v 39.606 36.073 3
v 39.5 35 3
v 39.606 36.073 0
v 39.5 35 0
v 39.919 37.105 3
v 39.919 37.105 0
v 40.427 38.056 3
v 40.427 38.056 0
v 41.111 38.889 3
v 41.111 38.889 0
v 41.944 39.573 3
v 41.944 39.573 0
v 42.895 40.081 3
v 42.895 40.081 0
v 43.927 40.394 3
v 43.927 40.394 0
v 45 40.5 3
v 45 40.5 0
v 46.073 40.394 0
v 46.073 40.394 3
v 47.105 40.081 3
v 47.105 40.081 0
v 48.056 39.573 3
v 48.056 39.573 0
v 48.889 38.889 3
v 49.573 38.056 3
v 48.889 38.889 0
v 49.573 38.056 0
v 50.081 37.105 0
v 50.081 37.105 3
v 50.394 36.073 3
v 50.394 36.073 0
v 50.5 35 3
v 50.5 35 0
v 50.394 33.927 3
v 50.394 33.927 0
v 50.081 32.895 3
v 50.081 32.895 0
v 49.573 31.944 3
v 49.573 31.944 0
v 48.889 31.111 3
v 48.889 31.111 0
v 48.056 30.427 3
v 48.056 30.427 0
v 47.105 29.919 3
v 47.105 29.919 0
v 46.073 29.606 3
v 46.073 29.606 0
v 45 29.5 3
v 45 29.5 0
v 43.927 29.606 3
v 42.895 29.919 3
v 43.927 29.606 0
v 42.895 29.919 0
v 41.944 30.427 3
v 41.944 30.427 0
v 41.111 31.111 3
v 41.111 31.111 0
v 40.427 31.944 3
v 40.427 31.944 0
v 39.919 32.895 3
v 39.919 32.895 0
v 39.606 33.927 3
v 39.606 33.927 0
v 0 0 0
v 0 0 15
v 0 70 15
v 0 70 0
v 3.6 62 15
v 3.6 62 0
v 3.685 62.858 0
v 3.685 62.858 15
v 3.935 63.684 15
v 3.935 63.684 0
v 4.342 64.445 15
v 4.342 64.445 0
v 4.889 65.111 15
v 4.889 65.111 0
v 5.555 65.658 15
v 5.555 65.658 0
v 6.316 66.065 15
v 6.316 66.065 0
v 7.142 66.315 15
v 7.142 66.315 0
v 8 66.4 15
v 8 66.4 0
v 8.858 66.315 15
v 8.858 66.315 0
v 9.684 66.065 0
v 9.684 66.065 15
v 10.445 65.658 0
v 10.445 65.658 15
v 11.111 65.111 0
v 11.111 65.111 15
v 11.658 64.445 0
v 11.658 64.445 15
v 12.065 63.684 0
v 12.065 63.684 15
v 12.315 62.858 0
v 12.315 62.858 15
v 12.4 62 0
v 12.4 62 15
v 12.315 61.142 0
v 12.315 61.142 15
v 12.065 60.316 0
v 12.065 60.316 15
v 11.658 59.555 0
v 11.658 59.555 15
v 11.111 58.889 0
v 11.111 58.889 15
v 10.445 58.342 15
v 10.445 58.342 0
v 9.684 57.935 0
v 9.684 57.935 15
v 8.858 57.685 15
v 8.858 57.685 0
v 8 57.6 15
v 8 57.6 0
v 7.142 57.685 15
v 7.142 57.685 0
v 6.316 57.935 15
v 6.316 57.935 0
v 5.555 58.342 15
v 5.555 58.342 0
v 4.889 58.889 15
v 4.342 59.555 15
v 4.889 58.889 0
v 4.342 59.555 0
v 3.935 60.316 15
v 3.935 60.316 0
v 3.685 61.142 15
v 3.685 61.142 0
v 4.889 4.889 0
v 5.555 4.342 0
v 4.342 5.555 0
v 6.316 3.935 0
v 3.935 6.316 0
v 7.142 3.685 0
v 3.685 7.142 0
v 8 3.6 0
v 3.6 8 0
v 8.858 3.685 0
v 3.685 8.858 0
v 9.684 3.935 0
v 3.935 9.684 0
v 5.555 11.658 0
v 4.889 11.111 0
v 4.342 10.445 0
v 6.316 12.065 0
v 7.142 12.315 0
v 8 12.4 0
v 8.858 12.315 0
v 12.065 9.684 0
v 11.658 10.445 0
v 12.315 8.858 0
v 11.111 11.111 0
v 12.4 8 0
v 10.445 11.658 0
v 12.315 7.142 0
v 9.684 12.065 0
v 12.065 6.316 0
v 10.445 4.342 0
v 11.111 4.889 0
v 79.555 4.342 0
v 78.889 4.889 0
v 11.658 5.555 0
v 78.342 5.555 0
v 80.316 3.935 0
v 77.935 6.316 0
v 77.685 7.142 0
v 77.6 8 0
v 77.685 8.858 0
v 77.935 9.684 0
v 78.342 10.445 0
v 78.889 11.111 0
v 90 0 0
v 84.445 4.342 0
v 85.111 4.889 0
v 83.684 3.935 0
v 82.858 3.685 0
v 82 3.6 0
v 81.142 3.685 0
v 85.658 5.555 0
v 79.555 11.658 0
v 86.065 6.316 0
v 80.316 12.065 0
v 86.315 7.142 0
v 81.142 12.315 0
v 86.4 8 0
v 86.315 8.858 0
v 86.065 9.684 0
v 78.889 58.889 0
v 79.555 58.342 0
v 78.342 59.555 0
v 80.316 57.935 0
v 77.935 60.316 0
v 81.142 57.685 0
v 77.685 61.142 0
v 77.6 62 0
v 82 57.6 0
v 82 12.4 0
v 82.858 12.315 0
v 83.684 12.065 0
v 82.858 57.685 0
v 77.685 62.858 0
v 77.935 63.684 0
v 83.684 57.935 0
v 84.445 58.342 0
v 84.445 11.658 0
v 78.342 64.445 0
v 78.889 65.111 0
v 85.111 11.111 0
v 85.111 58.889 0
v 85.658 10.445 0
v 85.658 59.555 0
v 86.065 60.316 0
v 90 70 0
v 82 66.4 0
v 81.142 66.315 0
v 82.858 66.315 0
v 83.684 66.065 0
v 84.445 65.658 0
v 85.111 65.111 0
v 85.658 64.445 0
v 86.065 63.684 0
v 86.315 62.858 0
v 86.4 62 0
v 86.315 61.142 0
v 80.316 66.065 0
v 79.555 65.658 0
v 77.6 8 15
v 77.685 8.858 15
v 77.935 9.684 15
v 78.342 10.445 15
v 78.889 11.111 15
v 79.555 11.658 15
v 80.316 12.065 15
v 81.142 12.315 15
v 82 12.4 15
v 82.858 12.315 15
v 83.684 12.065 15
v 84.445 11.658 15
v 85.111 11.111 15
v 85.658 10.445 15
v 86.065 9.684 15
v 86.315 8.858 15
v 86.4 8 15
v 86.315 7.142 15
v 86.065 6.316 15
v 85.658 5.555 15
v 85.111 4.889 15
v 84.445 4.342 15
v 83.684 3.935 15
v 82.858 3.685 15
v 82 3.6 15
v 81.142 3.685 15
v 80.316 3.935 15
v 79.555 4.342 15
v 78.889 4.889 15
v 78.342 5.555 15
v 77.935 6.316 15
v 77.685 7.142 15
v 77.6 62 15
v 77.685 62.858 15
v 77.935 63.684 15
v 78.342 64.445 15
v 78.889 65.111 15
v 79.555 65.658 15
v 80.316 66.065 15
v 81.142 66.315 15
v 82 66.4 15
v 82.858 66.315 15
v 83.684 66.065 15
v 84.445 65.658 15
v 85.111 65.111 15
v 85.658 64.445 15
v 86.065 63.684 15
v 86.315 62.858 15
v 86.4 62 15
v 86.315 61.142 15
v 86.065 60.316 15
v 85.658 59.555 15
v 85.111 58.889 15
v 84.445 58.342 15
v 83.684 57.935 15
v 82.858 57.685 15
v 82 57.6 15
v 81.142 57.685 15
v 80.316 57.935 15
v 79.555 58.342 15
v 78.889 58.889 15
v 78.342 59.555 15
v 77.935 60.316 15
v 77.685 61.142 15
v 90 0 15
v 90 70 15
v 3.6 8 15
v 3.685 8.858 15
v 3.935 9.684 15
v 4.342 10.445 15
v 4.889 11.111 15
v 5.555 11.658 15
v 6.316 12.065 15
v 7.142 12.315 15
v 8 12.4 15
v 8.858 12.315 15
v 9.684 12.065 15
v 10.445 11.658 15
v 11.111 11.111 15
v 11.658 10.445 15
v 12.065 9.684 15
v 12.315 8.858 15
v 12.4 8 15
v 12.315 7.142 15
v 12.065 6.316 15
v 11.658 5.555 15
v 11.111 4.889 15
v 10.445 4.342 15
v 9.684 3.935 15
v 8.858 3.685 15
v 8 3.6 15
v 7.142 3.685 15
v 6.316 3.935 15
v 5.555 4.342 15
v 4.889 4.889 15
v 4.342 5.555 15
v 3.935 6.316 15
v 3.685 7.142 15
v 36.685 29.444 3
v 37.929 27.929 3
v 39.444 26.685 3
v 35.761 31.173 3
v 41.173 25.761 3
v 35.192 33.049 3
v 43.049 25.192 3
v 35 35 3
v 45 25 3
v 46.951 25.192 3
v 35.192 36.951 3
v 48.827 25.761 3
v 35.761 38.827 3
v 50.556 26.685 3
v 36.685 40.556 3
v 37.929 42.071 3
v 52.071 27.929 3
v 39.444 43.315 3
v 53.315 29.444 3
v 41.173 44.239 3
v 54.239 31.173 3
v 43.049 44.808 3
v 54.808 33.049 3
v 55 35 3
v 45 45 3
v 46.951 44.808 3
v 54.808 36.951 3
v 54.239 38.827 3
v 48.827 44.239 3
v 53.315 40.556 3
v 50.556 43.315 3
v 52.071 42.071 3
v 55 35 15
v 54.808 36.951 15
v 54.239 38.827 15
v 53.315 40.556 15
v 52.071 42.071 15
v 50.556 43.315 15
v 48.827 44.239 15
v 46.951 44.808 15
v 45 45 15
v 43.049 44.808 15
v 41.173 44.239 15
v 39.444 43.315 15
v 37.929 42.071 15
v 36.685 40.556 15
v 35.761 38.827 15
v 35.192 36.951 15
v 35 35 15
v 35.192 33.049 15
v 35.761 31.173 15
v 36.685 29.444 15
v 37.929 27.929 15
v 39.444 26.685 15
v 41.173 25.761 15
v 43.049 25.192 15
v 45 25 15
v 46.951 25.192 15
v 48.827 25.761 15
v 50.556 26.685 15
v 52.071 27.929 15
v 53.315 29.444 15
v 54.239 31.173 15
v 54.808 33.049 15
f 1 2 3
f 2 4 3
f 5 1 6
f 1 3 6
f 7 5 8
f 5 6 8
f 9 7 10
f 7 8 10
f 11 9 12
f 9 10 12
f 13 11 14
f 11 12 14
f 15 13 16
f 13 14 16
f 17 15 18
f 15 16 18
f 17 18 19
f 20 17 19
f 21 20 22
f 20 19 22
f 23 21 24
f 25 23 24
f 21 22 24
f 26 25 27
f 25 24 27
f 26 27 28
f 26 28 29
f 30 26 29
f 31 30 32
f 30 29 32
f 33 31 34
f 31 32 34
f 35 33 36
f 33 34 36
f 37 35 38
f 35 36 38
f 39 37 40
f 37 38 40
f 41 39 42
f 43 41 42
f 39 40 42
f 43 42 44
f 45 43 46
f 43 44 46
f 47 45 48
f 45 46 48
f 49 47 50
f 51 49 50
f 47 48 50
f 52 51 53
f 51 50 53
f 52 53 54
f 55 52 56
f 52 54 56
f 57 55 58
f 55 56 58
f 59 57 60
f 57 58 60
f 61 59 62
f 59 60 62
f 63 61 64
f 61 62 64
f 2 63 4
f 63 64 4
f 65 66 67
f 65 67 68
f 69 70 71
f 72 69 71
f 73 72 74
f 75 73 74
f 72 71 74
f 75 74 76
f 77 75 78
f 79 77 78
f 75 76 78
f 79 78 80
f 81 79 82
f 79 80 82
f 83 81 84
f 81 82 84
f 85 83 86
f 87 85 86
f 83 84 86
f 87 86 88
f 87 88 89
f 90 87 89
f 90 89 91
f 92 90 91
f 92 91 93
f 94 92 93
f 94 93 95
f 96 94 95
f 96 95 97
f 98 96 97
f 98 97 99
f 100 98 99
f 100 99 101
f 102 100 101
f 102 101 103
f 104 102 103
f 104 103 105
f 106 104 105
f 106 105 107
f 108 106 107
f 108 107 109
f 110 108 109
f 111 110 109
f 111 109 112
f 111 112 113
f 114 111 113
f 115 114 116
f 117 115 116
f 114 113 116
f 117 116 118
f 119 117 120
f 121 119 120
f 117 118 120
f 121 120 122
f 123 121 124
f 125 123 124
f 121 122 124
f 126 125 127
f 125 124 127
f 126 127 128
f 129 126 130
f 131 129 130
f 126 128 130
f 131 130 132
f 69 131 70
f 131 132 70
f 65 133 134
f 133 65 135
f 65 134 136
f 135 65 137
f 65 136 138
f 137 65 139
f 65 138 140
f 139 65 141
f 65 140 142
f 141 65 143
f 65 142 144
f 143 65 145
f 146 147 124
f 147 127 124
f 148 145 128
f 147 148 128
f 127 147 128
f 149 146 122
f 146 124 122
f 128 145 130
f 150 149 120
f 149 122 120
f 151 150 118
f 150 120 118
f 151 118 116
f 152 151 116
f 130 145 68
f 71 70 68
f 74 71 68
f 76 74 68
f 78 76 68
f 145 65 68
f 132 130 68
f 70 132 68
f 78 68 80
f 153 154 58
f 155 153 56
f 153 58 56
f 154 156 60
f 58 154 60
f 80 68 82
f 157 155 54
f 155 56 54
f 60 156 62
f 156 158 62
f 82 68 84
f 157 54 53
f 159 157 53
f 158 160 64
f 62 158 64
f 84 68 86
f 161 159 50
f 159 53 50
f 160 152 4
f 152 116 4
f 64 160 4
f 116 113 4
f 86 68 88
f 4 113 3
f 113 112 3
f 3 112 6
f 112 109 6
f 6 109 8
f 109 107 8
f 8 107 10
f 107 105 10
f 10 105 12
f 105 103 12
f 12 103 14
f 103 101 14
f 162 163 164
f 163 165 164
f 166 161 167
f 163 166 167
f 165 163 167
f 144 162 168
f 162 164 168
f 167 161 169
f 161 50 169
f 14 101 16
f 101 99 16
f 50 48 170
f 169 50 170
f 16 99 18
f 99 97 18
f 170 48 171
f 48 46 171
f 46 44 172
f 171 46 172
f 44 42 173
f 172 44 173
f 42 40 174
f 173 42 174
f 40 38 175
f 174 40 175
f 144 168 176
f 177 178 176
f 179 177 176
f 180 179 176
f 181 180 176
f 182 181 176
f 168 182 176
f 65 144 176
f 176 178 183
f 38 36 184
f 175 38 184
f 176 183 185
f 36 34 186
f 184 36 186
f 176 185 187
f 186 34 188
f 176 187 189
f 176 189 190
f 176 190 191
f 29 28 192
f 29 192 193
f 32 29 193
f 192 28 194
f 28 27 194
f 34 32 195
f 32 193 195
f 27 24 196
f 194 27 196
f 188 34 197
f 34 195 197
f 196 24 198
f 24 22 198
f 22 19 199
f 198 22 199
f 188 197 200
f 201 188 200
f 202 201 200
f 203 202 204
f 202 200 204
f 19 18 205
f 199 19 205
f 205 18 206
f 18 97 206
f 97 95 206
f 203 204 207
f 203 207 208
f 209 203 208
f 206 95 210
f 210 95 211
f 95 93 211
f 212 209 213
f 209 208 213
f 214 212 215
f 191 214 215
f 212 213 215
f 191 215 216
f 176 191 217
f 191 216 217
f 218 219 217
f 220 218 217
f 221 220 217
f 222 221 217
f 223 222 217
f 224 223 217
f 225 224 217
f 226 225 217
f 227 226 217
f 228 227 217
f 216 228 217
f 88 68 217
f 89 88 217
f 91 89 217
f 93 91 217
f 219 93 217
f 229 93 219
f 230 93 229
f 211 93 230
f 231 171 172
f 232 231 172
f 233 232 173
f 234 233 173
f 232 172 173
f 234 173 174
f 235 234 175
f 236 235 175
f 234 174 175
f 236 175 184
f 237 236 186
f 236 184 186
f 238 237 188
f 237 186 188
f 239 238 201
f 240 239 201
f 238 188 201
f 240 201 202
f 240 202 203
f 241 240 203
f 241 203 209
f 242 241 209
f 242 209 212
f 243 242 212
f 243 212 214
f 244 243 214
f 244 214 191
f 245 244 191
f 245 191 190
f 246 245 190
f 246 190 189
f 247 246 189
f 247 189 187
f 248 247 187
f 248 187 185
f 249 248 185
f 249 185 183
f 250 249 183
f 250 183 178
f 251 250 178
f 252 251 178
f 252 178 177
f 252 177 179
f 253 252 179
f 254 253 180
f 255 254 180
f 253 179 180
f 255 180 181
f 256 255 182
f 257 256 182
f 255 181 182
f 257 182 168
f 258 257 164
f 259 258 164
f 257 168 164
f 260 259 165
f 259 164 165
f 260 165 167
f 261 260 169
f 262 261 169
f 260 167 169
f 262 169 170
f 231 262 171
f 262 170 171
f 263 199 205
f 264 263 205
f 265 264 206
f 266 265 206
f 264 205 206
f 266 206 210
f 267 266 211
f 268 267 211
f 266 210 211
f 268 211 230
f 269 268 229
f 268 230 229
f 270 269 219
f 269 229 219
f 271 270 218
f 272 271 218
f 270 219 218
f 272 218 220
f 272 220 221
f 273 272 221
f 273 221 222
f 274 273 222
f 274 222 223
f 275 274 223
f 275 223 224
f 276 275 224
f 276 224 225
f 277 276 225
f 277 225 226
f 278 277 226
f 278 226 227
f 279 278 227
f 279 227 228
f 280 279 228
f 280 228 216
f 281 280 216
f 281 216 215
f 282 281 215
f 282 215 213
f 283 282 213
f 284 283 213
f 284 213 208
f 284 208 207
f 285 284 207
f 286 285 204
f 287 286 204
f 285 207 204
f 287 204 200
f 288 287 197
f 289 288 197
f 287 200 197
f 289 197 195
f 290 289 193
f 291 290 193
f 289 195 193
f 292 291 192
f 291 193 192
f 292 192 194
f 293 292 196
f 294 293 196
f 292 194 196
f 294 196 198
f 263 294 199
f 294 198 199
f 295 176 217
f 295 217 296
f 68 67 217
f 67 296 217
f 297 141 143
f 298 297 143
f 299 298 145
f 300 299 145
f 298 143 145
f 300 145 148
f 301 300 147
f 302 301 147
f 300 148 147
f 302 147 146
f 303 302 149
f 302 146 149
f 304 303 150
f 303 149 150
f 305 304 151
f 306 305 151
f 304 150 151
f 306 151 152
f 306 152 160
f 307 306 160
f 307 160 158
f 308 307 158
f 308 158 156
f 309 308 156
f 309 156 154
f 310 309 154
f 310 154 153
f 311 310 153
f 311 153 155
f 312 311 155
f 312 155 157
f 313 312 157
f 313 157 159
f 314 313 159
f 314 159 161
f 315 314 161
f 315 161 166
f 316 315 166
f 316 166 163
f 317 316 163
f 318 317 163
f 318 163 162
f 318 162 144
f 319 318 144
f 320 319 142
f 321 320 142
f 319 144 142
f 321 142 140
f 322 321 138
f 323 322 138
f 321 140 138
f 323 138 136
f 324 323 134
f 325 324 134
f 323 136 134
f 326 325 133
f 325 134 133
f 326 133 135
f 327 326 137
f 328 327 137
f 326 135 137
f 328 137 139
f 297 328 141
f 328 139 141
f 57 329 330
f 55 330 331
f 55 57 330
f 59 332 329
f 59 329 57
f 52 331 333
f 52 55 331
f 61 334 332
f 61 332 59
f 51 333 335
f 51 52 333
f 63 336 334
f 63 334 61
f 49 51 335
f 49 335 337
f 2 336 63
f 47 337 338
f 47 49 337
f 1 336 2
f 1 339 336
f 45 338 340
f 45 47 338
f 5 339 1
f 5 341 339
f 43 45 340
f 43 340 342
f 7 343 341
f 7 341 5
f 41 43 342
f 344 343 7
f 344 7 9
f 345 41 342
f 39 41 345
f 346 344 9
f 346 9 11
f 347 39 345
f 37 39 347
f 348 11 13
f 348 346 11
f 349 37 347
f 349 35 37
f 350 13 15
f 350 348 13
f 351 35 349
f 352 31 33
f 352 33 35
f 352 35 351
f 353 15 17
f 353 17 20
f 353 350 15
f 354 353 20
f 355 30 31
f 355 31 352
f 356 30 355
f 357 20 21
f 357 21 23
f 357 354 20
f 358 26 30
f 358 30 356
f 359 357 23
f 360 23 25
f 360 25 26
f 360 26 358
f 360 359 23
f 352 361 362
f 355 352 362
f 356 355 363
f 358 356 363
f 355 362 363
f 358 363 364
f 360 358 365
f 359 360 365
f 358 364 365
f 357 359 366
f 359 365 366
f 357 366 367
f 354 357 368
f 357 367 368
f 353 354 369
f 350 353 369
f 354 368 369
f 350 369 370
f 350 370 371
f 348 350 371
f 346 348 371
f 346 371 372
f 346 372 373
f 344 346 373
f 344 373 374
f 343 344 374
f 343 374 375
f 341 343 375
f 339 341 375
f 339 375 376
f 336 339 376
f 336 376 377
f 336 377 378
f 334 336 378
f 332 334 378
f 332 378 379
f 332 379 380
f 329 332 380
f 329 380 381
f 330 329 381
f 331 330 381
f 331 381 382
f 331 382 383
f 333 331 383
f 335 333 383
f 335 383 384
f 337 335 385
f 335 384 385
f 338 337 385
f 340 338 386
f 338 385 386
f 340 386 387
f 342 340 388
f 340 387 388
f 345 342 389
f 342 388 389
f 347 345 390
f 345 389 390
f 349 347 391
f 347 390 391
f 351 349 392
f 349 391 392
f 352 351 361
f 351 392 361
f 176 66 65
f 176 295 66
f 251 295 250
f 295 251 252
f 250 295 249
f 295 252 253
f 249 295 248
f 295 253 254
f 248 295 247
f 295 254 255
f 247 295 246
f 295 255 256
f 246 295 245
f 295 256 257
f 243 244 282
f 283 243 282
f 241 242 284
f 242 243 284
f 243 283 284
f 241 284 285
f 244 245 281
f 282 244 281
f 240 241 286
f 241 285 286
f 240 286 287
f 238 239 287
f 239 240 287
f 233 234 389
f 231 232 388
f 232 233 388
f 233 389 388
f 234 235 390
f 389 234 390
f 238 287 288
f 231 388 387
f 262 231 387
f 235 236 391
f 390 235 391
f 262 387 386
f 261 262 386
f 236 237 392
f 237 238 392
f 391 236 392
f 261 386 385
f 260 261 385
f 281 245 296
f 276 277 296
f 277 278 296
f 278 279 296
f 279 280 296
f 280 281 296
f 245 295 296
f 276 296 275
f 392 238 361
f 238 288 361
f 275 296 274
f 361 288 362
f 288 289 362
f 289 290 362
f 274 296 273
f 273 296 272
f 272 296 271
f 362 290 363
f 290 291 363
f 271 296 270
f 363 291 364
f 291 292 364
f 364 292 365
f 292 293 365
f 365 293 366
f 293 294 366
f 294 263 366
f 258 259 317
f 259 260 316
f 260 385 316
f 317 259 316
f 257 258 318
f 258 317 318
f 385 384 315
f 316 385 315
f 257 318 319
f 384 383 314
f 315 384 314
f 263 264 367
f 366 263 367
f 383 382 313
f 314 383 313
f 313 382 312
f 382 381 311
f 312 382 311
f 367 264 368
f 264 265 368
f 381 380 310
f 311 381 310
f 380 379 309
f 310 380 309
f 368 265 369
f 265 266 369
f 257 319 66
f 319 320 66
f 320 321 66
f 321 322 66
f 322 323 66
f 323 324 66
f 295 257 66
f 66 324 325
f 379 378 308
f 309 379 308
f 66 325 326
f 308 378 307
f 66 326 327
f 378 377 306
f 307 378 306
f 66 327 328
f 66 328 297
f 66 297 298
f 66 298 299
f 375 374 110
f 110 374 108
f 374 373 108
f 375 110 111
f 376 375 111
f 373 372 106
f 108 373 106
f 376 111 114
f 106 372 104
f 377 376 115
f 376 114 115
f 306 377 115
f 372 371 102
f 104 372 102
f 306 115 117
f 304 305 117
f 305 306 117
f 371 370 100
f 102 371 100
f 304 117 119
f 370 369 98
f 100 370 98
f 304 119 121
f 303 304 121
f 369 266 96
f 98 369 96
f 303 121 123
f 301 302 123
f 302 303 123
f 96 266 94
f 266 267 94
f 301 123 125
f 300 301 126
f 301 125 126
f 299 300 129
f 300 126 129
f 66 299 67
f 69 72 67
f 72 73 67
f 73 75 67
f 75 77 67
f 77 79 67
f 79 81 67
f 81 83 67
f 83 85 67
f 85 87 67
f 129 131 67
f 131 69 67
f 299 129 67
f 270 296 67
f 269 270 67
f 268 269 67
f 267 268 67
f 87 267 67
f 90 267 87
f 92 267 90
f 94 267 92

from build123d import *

# Parameters (mm, degrees)
F0_W           = 90
F0_H           = 15
F4_D           = 8.8
F6_D           = 11
F6_CBORE_D     = 20
F6_CBORE_DEPTH = 12


with BuildPart() as f2:
    # F2: sweep along a path in F1
    with BuildLine(Plane.YZ) as f2_path:
        Line((0, 0), (70, 0))
    # F0 (on Front) → F2 (sweep)
    with BuildSketch(Plane.XZ):
        with Locations((45, 7.5)):
            Rectangle(F0_W, F0_H)
    sweep(path=f2_path.line)

    # F4 (through all)
    with Locations(Plane.XY.offset(15)):
        with Locations((8, 62), (82, 62), (82, 8), (8, 8)):
            Hole(F4_D / 2)

    # F6 (through all)
    with Locations(Plane.XY.offset(15)):
        with Locations((45, 35)):
            CounterBoreHole(F6_D / 2, F6_CBORE_D / 2, F6_CBORE_DEPTH)


solid = f2.part
